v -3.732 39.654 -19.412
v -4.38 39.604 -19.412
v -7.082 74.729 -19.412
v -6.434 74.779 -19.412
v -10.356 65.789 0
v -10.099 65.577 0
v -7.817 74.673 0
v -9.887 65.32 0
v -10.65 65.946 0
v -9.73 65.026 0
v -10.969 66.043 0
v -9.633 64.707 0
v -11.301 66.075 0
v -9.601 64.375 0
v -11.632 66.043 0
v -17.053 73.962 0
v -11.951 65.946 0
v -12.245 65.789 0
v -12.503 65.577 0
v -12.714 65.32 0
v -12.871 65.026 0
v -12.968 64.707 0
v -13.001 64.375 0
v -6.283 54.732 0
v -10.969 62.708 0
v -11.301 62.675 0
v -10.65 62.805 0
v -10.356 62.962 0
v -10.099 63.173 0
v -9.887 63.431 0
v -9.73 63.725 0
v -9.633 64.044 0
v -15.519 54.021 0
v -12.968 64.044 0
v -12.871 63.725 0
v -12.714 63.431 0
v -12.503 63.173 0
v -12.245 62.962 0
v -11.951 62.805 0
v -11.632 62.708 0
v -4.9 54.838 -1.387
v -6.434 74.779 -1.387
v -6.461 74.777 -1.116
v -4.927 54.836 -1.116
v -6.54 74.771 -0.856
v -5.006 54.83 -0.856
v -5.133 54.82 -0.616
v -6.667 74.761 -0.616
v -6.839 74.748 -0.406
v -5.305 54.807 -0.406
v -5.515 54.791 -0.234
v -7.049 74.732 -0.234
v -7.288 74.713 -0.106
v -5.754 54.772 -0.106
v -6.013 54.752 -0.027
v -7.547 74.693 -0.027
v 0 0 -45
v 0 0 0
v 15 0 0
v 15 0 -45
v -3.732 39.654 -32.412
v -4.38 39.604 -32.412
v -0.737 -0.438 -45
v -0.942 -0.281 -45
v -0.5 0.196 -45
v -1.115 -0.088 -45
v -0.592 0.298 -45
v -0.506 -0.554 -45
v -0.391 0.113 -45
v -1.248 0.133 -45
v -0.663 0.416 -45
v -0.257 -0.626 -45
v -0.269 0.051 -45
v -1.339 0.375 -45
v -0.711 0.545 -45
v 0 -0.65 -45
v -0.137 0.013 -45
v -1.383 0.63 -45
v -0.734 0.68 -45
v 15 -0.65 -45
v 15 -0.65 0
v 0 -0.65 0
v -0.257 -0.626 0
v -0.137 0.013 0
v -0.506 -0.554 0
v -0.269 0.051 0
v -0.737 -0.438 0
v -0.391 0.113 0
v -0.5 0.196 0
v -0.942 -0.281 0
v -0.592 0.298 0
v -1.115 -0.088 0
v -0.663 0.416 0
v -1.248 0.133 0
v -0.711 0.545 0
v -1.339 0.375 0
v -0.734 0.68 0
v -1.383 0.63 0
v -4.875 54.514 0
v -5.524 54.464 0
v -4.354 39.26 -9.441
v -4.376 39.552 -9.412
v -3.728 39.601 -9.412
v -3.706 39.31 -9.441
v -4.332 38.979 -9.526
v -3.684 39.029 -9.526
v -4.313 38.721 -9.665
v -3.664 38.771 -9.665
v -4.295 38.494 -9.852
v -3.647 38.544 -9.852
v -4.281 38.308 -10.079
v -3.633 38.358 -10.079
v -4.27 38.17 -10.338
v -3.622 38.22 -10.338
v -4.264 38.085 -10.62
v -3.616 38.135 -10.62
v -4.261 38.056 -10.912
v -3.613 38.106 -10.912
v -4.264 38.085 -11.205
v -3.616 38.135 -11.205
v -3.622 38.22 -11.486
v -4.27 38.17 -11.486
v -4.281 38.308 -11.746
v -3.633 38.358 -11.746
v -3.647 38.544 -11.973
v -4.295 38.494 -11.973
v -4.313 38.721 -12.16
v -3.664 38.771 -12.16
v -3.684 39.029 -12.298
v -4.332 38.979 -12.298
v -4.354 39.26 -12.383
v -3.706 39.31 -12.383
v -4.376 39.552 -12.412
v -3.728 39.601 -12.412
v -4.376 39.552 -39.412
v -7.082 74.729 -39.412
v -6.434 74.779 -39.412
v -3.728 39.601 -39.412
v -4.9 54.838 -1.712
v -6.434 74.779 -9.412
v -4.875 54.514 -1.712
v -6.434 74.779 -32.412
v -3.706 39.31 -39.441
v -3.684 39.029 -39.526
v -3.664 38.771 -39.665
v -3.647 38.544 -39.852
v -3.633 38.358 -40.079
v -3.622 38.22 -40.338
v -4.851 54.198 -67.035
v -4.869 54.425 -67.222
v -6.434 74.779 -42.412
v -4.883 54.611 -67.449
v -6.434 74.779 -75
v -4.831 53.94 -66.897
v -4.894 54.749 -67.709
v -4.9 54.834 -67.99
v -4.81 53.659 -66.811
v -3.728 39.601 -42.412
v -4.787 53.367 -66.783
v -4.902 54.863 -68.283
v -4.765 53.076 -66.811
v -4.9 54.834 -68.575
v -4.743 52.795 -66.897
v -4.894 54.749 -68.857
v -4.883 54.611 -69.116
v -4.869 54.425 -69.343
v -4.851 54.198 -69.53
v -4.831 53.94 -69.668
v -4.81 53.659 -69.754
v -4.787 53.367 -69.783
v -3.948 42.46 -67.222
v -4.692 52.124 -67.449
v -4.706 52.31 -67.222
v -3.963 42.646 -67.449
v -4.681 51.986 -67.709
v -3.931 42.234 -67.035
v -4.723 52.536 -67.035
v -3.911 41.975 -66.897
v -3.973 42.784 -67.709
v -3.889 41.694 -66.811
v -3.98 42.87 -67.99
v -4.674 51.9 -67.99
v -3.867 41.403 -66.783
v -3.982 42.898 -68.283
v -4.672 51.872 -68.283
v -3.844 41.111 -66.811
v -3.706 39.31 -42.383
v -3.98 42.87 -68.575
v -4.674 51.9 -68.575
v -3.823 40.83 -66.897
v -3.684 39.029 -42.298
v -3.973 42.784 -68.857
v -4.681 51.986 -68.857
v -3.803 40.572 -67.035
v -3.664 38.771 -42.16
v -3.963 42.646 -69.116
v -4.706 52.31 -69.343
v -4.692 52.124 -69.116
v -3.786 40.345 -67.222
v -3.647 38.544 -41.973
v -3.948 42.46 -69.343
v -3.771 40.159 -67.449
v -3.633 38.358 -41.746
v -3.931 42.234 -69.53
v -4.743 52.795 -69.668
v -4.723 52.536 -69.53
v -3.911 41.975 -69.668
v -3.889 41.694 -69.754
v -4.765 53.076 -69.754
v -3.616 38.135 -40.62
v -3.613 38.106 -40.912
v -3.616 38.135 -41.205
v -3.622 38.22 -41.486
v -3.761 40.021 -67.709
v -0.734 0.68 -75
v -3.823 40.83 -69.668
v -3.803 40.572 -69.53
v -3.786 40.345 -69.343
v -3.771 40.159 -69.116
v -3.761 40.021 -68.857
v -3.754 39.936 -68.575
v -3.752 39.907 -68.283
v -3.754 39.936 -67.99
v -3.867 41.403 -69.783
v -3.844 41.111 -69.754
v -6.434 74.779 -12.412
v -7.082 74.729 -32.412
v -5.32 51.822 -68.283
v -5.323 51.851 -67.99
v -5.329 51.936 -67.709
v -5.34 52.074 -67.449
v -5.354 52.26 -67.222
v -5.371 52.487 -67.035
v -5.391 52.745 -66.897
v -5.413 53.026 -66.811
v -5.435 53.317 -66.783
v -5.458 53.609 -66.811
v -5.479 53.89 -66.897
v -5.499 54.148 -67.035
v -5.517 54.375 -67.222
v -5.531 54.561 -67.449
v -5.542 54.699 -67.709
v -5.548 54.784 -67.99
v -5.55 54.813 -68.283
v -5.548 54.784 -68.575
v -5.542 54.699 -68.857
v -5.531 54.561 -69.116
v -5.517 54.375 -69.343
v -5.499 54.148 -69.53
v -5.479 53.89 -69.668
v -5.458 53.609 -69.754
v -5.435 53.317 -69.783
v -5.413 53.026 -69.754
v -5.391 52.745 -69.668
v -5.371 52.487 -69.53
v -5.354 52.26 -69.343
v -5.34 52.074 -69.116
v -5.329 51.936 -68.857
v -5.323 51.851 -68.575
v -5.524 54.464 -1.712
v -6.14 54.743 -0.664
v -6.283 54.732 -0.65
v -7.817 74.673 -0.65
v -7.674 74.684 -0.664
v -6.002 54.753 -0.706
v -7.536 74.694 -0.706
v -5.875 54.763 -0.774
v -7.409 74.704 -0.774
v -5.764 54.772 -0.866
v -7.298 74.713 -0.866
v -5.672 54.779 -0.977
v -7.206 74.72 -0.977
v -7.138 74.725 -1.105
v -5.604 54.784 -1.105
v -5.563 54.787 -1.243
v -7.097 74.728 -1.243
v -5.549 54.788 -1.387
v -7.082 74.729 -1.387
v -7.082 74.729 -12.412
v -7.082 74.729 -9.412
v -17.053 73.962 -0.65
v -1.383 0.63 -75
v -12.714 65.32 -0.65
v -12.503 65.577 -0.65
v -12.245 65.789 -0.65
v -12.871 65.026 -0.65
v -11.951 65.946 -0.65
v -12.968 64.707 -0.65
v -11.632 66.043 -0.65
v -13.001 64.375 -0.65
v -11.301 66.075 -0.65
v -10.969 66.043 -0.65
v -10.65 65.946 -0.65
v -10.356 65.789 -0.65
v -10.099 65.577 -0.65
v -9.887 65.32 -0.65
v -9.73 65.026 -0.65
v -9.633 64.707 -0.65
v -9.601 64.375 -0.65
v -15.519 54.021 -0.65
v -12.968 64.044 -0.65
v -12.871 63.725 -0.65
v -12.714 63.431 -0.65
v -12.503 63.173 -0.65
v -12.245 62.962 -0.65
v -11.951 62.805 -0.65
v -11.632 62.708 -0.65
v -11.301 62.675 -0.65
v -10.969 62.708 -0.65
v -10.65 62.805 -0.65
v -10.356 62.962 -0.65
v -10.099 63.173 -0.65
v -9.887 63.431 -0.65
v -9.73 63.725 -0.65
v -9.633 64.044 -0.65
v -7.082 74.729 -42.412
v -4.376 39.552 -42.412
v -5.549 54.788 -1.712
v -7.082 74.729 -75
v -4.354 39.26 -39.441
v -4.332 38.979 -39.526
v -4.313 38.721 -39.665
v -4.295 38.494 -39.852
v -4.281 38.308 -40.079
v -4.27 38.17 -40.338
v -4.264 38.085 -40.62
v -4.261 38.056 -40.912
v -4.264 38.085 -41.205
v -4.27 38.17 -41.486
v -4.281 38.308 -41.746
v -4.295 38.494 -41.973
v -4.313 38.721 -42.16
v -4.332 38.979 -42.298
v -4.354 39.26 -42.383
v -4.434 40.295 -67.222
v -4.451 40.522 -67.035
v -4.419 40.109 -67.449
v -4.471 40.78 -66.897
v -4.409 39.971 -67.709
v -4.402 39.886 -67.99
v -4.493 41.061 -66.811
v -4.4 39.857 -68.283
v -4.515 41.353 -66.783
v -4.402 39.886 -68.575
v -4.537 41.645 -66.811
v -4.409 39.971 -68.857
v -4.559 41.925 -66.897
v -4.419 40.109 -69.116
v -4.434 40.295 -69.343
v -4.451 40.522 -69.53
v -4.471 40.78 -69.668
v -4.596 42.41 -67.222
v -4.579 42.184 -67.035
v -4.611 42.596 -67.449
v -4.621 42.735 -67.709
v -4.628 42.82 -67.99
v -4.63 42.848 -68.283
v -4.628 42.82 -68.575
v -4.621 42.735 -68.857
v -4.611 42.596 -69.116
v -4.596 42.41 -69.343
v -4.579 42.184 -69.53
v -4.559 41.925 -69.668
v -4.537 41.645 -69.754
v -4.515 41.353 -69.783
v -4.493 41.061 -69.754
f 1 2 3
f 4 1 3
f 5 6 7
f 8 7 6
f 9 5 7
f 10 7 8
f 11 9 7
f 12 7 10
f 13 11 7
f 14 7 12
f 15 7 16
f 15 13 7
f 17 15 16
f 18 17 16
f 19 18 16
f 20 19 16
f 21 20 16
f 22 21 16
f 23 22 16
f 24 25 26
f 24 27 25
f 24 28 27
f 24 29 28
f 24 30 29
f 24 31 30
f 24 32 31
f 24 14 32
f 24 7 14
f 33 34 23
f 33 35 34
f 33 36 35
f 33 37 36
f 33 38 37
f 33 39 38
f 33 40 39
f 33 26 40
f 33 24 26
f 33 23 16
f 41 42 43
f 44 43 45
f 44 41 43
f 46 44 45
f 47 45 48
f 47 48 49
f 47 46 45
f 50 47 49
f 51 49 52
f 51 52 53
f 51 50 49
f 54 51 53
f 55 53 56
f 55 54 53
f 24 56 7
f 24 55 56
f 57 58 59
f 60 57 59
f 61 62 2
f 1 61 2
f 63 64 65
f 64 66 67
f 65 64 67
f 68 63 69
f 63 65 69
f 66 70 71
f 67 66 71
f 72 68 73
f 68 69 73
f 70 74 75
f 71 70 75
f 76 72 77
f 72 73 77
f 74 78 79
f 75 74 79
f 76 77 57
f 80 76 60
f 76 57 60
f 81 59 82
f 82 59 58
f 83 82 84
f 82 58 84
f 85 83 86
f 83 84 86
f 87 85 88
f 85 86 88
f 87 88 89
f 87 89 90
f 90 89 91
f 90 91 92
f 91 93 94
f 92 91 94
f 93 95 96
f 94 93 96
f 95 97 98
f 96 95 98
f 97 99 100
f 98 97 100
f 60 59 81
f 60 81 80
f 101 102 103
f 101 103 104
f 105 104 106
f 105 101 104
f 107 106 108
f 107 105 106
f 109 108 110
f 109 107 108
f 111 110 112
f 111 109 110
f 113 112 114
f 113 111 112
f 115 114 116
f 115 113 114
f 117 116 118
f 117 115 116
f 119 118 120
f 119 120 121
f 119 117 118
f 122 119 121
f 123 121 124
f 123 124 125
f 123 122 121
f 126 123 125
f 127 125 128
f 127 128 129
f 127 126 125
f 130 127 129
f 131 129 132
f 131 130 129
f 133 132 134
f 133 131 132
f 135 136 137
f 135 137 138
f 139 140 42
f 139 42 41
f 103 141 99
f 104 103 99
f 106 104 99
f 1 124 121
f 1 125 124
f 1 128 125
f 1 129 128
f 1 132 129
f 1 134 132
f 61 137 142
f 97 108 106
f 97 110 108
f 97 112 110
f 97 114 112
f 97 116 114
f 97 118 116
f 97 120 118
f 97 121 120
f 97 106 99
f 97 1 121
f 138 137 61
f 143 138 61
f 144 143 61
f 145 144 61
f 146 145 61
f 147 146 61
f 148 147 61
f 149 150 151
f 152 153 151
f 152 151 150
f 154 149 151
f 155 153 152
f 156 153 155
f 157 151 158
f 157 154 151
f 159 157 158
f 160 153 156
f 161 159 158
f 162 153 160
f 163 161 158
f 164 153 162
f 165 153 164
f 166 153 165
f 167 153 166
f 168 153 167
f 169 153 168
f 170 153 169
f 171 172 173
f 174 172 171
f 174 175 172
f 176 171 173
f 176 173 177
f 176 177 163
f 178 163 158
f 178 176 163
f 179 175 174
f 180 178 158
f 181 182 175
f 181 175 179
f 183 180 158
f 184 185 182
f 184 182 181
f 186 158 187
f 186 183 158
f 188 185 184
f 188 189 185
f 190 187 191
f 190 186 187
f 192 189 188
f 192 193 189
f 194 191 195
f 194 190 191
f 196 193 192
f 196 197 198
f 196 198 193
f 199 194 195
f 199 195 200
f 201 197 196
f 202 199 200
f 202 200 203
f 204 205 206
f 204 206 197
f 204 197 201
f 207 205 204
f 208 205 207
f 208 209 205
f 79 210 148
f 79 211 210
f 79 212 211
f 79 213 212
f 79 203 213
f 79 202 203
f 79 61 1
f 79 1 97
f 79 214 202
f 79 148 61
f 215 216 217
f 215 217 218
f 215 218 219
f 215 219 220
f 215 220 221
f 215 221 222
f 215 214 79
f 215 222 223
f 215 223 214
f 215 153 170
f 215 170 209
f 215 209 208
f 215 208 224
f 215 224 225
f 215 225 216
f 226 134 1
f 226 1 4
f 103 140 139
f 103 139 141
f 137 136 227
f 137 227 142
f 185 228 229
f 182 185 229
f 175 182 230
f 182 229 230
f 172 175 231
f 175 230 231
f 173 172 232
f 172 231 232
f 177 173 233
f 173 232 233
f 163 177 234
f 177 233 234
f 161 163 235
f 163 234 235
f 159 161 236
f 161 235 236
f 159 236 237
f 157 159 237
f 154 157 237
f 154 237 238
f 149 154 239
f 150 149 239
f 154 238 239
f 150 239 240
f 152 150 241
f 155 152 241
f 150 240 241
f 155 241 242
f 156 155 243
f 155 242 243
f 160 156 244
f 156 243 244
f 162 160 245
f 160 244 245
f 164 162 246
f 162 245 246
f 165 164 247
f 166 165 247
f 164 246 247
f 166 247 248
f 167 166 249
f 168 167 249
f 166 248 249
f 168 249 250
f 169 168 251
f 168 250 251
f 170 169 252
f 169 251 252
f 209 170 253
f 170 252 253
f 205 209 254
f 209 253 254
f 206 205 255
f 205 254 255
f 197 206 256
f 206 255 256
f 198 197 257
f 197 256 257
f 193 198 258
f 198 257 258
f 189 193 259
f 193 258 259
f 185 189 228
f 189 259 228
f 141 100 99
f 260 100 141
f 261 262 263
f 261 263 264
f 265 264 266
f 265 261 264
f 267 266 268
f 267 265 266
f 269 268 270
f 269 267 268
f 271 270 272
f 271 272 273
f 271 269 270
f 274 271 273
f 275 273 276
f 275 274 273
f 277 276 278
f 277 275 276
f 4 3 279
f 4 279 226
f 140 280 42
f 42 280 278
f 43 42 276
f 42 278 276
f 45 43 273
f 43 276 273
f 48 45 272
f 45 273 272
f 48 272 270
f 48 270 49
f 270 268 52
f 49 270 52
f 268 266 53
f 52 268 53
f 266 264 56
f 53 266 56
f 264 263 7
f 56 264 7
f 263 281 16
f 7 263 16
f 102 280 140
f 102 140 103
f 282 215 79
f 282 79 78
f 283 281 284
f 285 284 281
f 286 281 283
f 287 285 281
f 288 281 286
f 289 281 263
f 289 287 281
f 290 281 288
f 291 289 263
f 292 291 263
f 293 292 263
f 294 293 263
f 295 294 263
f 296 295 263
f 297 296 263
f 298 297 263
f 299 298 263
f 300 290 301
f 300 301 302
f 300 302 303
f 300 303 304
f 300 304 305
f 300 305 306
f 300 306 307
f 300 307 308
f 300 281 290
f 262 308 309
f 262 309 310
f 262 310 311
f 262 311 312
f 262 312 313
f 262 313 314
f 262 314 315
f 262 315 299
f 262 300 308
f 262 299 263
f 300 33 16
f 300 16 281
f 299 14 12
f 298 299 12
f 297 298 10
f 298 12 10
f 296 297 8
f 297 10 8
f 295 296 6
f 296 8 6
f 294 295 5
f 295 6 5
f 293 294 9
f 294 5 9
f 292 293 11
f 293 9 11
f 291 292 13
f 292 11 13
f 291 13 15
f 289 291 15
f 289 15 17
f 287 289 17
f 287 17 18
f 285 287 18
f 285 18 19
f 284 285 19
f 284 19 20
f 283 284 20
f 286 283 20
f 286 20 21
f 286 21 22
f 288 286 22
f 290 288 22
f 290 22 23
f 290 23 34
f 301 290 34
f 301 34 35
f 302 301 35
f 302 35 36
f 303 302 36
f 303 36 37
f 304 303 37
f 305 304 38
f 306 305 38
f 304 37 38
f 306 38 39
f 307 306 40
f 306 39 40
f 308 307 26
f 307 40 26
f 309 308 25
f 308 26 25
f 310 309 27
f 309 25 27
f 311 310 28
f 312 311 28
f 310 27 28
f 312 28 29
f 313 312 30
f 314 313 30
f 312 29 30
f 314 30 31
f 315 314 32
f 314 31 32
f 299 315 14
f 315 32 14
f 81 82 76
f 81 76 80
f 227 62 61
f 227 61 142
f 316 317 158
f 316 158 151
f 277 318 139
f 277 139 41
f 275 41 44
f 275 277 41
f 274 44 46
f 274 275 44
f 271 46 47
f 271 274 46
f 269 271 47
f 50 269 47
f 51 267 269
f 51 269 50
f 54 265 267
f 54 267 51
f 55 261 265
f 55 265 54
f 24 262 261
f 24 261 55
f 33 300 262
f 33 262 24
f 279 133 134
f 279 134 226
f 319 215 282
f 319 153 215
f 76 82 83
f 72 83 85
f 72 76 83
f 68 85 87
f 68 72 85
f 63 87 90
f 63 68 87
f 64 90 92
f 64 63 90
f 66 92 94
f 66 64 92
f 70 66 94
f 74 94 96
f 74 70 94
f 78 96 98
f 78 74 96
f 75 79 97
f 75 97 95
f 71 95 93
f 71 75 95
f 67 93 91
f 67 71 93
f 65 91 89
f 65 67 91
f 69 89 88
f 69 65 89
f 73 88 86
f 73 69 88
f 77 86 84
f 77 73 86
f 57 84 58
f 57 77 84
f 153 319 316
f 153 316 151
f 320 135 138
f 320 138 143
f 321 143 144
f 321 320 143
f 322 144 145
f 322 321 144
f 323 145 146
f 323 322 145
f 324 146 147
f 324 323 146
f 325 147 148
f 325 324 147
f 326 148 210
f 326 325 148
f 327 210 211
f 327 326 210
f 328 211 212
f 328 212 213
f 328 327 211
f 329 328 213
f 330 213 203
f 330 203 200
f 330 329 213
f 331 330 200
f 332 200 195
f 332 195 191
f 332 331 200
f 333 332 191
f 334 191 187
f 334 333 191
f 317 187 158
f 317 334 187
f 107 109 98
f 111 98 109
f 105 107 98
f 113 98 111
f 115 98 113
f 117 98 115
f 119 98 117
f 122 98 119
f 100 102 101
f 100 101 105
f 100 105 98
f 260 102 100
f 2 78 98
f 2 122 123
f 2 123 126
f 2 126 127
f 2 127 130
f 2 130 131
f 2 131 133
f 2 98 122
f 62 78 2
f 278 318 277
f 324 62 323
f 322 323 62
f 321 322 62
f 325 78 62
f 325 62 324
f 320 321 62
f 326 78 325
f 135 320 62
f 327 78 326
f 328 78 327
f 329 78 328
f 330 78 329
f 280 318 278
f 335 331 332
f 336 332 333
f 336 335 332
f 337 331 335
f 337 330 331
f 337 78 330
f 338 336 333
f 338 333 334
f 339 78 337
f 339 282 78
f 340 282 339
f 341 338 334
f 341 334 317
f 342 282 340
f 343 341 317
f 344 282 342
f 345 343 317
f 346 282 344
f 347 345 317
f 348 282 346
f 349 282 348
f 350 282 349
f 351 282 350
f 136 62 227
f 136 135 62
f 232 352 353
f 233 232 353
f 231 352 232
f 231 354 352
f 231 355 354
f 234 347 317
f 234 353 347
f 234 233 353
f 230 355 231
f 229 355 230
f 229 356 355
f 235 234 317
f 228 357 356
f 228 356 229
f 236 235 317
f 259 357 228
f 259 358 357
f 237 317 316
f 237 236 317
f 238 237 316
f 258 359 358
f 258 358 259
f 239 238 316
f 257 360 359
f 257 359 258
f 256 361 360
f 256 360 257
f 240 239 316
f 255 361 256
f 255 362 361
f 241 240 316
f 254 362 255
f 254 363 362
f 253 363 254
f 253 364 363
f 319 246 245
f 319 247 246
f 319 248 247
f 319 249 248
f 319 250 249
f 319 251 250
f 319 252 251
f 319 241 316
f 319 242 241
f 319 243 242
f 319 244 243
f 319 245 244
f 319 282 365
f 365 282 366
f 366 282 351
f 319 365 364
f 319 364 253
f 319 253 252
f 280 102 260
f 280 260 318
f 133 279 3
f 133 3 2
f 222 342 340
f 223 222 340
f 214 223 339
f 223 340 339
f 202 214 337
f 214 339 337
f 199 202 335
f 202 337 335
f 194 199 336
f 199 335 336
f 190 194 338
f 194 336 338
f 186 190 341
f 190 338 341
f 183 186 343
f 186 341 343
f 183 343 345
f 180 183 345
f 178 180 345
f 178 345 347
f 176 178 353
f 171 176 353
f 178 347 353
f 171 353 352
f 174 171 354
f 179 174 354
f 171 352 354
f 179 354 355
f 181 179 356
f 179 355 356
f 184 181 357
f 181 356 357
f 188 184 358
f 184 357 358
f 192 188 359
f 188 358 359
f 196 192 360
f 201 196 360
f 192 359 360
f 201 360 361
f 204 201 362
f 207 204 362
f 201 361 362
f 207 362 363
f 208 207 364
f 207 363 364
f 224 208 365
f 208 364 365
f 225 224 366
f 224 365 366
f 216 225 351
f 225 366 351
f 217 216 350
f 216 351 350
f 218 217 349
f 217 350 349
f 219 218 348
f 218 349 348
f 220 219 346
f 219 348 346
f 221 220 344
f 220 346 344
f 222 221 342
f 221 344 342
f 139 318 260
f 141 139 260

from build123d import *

# Parameters (mm, degrees)
VERTICAL_WALL_DEPTH           = 0.65
SMALL_END_ARM_DEPTH           = 75
SKETCH10_W                    = 13
SKETCH10_H                    = 35.229215797
SMALL_END_SLOTS_DEPTH         = 0.65
EDGE_FLANGE4_STRIP_W          = 4.0732
EDGE_FLANGE4_STRIP_H          = 0.65
EDGE_FLANGE4_STRIP_CUT_DEPTH  = 20
EDGE_FLANGE4_RELIEF_W         = 4.3982
EDGE_FLANGE4_RELIEF_H         = 0.325
EDGE_FLANGE4_RELIEF_CUT_DEPTH = 0.65
EDGE_FLANGE4_DEPTH            = 20
SKETCH28_R                    = 1.5
GUARD_MOUNTING_HOLES_2_DEPTH  = 0.65
CUT_EXTRUDE1_START            = -80
CUT_EXTRUDE1_DEPTH            = 35
M3_CLEARANCE_HOLE1_D          = 3.4
M3_CLEARANCE_HOLE1_DEPTH      = 10
M3_CLEARANCE_HOLE1_TIP        = 1.021463052


# Read off the part's stored shape, not the designer's step: Cut-Extrude1
# Sheet-metal steps are written as plain solids
with BuildPart() as part:
    # Sketch1 → Vertical Wall (new body)
    with BuildSketch(Plane(origin=(0, 0, 0), x_dir=(1, 0, 0), z_dir=(0, 1, 0))):
        Polygon((0, 0), (15, 0), (15, 80), (0.01, 75.000714286), (0, 75), align=None)
    extrude(amount=-VERTICAL_WALL_DEPTH)

    # Small End Arm section (across the edge) → Small End Arm (add)
    with BuildSketch(Plane(origin=(-0.682114537, 0, -75), x_dir=(0.9970544854948823, 0.07669649897182769, 0), z_dir=(0, 0, 1))):
        with BuildLine():
            Line((-0.65, 0.682114537), (-0.65, 75))
            Line((-0.65, 75), (0, 75))
            Line((0, 75), (0, 0.682114537))
            ThreePointArc((0, 0.682114537), (0.196140236, 0.181631966), (0.680105359, -0.052315797))
            Line((0.680105359, -0.052315797), (0.630252635, -0.700401212))
            ThreePointArc((0.630252635, -0.700401212), (-0.280779186, -0.26001027), (-0.65, 0.682114537))
        make_face()
    extrude(amount=SMALL_END_ARM_DEPTH)

    # Sketch10 → Small End Slots (cut)
    with BuildSketch(Plane(origin=(-1.326187514, -0.102014424, 0), x_dir=(0, 0, 1), z_dir=(-0.9970544854948824, -0.07669649897182769, 0))):
        with Locations((-25.9123, 57.437707899)):
            Rectangle(SKETCH10_W, SKETCH10_H)
        with BuildLine():
            Line((-39.4123, 75.052315797), (-39.4123, 39.770784203))
            ThreePointArc((-39.4123, 39.770784203), (-40.9123, 38.270784203), (-42.4123, 39.770784203))
            Line((-42.4123, 39.770784203), (-42.4123, 75.052315797))
            ThreePointArc((-42.4123, 75.052315797), (-40.9123, 76.552315797), (-39.4123, 75.052315797))
        make_face()
        with BuildLine():
            Line((-9.4123, 75.052315797), (-9.4123, 39.770784203))
            ThreePointArc((-9.4123, 39.770784203), (-10.9123, 38.270784203), (-12.4123, 39.770784203))
            Line((-12.4123, 39.770784203), (-12.4123, 75.052315797))
            ThreePointArc((-12.4123, 75.052315797), (-10.9123, 76.552315797), (-9.4123, 75.052315797))
        make_face()
    extrude(amount=-SMALL_END_SLOTS_DEPTH, mode=Mode.SUBTRACT)

    # Edge-Flange4 strip (across the edge) → Edge-Flange4 strip cut (cut)
    with BuildSketch(Plane(origin=(-5.548507396, 54.788143978, 0), x_dir=(0, 0, -1), z_dir=(-0.0766964989718277, 0.9970544854948823, 0))):
        with Locations((-0.65, -0.325)):
            Rectangle(EDGE_FLANGE4_STRIP_W, EDGE_FLANGE4_STRIP_H)
    extrude(amount=EDGE_FLANGE4_STRIP_CUT_DEPTH, mode=Mode.SUBTRACT)

    # Edge-Flange4 relief (on the sheet) → Edge-Flange4 relief cut (cut)
    with BuildSketch(Plane(origin=(-5.548507396, 54.788143978, -1.3866), x_dir=(0, 0, -1), z_dir=(-0.9970544854948823, -0.0766964989718277, 6.982374222178593e-15))):
        with Locations((-1.8741, 0.1625)):
            Rectangle(EDGE_FLANGE4_RELIEF_W, EDGE_FLANGE4_RELIEF_H)
    extrude(amount=-EDGE_FLANGE4_RELIEF_CUT_DEPTH, mode=Mode.SUBTRACT)

    # Edge-Flange4 section (across the edge) → Edge-Flange4 (add)
    with BuildSketch(Plane(origin=(-5.548507396, 54.788143978, 0), x_dir=(0, 0, -1), z_dir=(-0.0766964989718277, 0.9970544854948823, 0))):
        with BuildLine():
            Line((0, 0.7366), (0, 10))
            Line((0, 10), (0.65, 10))
            Line((0.65, 10), (0.65, 0.7366))
            ThreePointArc((0.65, 0.7366), (0.865745145, 0.215745145), (1.3866, 0))
            Line((1.3866, 0), (1.3866, -0.65))
            ThreePointArc((1.3866, -0.65), (0.406125737, -0.243874263), (0, 0.7366))
        make_face()
    extrude(amount=EDGE_FLANGE4_DEPTH)

    # Sketch28 → Guard Mounting Holes 2 (cut)
    with BuildSketch(Plane(origin=(-1.326187514, -0.102014424, 0), x_dir=(0, 0, 1), z_dir=(-0.9970544854948823, -0.07669649897182768, 0))):
        with Locations(Location((-68.282596145, 53.577296087, 0), (0, 0, 270))):
            Circle(SKETCH28_R)
        with Locations(Location((-68.282596145, 41.577296087, 0), (0, 0, 270))):
            Circle(SKETCH28_R)
    extrude(amount=-GUARD_MOUNTING_HOLES_2_DEPTH, mode=Mode.SUBTRACT)

    # Cut-Extrude1 outline → Cut-Extrude1 (cut)
    with BuildSketch(Plane.XY.offset(CUT_EXTRUDE1_START)):
        with BuildLine():
            Line((-0.734430334, 0.680105359), (-1.38251575, 0.630252635))
            ThreePointArc((-1.38251575, 0.630252635), (-0.942124807, -0.280779186), (0, -0.65))
            Line((0, -0.65), (15, -0.65))
            Line((15, -0.65), (15, 0))
            Line((15, 0), (0, 0))
            ThreePointArc((0, 0), (-0.500482571, 0.196140236), (-0.734430334, 0.680105359))
        make_face()
    extrude(amount=CUT_EXTRUDE1_DEPTH, mode=Mode.SUBTRACT)

    # M3 Clearance Hole1
    with Locations(Plane(origin=(0, 0, -0.65), x_dir=(-1, 0, 0), z_dir=(0, 0, -1))):
        with Locations((11.300744813, 64.375206338)):
            Hole(M3_CLEARANCE_HOLE1_D / 2, depth=M3_CLEARANCE_HOLE1_DEPTH)
            with Locations((0, 0, -(M3_CLEARANCE_HOLE1_DEPTH + M3_CLEARANCE_HOLE1_TIP / 2))):  # 118° drill point
                Cone(0, M3_CLEARANCE_HOLE1_D / 2, M3_CLEARANCE_HOLE1_TIP, mode=Mode.SUBTRACT)


solid = part.part
